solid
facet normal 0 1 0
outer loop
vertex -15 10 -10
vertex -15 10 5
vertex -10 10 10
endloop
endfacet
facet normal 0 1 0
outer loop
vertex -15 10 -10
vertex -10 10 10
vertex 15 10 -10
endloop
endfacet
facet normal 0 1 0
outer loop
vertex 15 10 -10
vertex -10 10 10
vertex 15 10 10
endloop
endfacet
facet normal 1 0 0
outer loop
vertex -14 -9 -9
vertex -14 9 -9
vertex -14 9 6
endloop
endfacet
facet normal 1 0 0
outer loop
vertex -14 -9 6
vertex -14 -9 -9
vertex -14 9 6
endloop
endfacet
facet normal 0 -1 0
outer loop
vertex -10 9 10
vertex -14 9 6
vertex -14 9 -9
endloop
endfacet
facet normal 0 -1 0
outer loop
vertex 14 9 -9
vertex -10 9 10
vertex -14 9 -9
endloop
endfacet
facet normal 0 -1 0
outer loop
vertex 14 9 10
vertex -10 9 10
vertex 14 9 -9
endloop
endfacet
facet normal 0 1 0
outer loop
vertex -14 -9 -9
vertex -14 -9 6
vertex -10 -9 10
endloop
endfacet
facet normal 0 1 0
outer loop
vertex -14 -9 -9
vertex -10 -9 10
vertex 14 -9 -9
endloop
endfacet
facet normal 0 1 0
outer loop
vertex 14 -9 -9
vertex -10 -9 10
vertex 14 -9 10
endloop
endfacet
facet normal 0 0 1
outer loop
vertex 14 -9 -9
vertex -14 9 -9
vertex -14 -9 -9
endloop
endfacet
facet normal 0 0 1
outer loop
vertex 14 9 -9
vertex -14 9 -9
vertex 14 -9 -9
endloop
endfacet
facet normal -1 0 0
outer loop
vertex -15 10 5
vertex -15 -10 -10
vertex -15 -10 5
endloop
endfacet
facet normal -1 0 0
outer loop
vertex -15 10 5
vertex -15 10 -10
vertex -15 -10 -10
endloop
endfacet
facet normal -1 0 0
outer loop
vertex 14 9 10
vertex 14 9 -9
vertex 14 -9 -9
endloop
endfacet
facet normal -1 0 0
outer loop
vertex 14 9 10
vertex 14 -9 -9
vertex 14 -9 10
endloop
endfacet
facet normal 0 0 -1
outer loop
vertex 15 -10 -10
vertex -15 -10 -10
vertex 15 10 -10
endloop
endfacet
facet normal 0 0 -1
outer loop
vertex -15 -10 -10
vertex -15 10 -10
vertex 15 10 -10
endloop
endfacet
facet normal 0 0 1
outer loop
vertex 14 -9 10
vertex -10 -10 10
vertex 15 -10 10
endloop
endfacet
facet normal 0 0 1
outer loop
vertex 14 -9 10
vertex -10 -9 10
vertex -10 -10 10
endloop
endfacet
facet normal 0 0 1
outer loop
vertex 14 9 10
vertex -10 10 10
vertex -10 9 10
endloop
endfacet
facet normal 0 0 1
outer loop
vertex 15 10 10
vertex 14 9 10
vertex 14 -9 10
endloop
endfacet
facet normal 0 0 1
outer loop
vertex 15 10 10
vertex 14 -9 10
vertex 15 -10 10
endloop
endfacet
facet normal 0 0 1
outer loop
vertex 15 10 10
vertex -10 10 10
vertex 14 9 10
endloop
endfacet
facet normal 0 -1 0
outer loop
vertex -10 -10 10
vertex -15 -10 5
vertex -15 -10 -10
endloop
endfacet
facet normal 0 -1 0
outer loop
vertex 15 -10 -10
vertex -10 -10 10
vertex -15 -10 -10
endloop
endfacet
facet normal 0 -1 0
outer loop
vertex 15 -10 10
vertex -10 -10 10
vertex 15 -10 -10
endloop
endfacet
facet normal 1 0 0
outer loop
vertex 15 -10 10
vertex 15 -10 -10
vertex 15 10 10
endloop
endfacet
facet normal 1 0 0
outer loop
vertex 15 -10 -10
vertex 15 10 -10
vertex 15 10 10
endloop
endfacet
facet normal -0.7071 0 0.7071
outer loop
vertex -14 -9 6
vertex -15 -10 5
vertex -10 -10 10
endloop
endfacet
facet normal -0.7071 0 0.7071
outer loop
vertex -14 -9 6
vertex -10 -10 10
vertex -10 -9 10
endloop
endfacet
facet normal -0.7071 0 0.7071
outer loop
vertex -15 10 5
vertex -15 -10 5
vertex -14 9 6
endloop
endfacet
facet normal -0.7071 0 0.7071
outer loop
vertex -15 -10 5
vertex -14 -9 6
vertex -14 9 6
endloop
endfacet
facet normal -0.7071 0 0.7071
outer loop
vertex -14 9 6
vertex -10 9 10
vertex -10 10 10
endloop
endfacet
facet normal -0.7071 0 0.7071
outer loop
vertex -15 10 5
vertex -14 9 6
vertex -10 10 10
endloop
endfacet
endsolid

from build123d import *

# Parameters (mm, degrees)
F0_W          = 30
F0_H          = 20
F1_DEPTH      = 10
F1_DEPTH_BACK = 10
F2_SIZE       = 5
F3_T          = -1


with BuildPart() as f1:
    # F0 (on Front) → F1 (new body, two sides)
    with BuildSketch(Plane.XZ) as f1_sk:
        Rectangle(F0_W, F0_H)
    extrude(amount=-F1_DEPTH)
    extrude(f1_sk.sketch, amount=F1_DEPTH_BACK)

    # F2
    f2_edges = [f1.edges().sort_by_distance(p)[0] for p in [
        (-15, 0, 10),
    ]]
    chamfer(f2_edges, length=F2_SIZE)

    # F3
    f3_openings = [f1.faces().sort_by_distance(p)[0] for p in [
        (2.5, 0, 10),
        (-12.5, 0, 7.5),
    ]]
    offset(amount=F3_T, openings=f3_openings)


solid = f1.part
